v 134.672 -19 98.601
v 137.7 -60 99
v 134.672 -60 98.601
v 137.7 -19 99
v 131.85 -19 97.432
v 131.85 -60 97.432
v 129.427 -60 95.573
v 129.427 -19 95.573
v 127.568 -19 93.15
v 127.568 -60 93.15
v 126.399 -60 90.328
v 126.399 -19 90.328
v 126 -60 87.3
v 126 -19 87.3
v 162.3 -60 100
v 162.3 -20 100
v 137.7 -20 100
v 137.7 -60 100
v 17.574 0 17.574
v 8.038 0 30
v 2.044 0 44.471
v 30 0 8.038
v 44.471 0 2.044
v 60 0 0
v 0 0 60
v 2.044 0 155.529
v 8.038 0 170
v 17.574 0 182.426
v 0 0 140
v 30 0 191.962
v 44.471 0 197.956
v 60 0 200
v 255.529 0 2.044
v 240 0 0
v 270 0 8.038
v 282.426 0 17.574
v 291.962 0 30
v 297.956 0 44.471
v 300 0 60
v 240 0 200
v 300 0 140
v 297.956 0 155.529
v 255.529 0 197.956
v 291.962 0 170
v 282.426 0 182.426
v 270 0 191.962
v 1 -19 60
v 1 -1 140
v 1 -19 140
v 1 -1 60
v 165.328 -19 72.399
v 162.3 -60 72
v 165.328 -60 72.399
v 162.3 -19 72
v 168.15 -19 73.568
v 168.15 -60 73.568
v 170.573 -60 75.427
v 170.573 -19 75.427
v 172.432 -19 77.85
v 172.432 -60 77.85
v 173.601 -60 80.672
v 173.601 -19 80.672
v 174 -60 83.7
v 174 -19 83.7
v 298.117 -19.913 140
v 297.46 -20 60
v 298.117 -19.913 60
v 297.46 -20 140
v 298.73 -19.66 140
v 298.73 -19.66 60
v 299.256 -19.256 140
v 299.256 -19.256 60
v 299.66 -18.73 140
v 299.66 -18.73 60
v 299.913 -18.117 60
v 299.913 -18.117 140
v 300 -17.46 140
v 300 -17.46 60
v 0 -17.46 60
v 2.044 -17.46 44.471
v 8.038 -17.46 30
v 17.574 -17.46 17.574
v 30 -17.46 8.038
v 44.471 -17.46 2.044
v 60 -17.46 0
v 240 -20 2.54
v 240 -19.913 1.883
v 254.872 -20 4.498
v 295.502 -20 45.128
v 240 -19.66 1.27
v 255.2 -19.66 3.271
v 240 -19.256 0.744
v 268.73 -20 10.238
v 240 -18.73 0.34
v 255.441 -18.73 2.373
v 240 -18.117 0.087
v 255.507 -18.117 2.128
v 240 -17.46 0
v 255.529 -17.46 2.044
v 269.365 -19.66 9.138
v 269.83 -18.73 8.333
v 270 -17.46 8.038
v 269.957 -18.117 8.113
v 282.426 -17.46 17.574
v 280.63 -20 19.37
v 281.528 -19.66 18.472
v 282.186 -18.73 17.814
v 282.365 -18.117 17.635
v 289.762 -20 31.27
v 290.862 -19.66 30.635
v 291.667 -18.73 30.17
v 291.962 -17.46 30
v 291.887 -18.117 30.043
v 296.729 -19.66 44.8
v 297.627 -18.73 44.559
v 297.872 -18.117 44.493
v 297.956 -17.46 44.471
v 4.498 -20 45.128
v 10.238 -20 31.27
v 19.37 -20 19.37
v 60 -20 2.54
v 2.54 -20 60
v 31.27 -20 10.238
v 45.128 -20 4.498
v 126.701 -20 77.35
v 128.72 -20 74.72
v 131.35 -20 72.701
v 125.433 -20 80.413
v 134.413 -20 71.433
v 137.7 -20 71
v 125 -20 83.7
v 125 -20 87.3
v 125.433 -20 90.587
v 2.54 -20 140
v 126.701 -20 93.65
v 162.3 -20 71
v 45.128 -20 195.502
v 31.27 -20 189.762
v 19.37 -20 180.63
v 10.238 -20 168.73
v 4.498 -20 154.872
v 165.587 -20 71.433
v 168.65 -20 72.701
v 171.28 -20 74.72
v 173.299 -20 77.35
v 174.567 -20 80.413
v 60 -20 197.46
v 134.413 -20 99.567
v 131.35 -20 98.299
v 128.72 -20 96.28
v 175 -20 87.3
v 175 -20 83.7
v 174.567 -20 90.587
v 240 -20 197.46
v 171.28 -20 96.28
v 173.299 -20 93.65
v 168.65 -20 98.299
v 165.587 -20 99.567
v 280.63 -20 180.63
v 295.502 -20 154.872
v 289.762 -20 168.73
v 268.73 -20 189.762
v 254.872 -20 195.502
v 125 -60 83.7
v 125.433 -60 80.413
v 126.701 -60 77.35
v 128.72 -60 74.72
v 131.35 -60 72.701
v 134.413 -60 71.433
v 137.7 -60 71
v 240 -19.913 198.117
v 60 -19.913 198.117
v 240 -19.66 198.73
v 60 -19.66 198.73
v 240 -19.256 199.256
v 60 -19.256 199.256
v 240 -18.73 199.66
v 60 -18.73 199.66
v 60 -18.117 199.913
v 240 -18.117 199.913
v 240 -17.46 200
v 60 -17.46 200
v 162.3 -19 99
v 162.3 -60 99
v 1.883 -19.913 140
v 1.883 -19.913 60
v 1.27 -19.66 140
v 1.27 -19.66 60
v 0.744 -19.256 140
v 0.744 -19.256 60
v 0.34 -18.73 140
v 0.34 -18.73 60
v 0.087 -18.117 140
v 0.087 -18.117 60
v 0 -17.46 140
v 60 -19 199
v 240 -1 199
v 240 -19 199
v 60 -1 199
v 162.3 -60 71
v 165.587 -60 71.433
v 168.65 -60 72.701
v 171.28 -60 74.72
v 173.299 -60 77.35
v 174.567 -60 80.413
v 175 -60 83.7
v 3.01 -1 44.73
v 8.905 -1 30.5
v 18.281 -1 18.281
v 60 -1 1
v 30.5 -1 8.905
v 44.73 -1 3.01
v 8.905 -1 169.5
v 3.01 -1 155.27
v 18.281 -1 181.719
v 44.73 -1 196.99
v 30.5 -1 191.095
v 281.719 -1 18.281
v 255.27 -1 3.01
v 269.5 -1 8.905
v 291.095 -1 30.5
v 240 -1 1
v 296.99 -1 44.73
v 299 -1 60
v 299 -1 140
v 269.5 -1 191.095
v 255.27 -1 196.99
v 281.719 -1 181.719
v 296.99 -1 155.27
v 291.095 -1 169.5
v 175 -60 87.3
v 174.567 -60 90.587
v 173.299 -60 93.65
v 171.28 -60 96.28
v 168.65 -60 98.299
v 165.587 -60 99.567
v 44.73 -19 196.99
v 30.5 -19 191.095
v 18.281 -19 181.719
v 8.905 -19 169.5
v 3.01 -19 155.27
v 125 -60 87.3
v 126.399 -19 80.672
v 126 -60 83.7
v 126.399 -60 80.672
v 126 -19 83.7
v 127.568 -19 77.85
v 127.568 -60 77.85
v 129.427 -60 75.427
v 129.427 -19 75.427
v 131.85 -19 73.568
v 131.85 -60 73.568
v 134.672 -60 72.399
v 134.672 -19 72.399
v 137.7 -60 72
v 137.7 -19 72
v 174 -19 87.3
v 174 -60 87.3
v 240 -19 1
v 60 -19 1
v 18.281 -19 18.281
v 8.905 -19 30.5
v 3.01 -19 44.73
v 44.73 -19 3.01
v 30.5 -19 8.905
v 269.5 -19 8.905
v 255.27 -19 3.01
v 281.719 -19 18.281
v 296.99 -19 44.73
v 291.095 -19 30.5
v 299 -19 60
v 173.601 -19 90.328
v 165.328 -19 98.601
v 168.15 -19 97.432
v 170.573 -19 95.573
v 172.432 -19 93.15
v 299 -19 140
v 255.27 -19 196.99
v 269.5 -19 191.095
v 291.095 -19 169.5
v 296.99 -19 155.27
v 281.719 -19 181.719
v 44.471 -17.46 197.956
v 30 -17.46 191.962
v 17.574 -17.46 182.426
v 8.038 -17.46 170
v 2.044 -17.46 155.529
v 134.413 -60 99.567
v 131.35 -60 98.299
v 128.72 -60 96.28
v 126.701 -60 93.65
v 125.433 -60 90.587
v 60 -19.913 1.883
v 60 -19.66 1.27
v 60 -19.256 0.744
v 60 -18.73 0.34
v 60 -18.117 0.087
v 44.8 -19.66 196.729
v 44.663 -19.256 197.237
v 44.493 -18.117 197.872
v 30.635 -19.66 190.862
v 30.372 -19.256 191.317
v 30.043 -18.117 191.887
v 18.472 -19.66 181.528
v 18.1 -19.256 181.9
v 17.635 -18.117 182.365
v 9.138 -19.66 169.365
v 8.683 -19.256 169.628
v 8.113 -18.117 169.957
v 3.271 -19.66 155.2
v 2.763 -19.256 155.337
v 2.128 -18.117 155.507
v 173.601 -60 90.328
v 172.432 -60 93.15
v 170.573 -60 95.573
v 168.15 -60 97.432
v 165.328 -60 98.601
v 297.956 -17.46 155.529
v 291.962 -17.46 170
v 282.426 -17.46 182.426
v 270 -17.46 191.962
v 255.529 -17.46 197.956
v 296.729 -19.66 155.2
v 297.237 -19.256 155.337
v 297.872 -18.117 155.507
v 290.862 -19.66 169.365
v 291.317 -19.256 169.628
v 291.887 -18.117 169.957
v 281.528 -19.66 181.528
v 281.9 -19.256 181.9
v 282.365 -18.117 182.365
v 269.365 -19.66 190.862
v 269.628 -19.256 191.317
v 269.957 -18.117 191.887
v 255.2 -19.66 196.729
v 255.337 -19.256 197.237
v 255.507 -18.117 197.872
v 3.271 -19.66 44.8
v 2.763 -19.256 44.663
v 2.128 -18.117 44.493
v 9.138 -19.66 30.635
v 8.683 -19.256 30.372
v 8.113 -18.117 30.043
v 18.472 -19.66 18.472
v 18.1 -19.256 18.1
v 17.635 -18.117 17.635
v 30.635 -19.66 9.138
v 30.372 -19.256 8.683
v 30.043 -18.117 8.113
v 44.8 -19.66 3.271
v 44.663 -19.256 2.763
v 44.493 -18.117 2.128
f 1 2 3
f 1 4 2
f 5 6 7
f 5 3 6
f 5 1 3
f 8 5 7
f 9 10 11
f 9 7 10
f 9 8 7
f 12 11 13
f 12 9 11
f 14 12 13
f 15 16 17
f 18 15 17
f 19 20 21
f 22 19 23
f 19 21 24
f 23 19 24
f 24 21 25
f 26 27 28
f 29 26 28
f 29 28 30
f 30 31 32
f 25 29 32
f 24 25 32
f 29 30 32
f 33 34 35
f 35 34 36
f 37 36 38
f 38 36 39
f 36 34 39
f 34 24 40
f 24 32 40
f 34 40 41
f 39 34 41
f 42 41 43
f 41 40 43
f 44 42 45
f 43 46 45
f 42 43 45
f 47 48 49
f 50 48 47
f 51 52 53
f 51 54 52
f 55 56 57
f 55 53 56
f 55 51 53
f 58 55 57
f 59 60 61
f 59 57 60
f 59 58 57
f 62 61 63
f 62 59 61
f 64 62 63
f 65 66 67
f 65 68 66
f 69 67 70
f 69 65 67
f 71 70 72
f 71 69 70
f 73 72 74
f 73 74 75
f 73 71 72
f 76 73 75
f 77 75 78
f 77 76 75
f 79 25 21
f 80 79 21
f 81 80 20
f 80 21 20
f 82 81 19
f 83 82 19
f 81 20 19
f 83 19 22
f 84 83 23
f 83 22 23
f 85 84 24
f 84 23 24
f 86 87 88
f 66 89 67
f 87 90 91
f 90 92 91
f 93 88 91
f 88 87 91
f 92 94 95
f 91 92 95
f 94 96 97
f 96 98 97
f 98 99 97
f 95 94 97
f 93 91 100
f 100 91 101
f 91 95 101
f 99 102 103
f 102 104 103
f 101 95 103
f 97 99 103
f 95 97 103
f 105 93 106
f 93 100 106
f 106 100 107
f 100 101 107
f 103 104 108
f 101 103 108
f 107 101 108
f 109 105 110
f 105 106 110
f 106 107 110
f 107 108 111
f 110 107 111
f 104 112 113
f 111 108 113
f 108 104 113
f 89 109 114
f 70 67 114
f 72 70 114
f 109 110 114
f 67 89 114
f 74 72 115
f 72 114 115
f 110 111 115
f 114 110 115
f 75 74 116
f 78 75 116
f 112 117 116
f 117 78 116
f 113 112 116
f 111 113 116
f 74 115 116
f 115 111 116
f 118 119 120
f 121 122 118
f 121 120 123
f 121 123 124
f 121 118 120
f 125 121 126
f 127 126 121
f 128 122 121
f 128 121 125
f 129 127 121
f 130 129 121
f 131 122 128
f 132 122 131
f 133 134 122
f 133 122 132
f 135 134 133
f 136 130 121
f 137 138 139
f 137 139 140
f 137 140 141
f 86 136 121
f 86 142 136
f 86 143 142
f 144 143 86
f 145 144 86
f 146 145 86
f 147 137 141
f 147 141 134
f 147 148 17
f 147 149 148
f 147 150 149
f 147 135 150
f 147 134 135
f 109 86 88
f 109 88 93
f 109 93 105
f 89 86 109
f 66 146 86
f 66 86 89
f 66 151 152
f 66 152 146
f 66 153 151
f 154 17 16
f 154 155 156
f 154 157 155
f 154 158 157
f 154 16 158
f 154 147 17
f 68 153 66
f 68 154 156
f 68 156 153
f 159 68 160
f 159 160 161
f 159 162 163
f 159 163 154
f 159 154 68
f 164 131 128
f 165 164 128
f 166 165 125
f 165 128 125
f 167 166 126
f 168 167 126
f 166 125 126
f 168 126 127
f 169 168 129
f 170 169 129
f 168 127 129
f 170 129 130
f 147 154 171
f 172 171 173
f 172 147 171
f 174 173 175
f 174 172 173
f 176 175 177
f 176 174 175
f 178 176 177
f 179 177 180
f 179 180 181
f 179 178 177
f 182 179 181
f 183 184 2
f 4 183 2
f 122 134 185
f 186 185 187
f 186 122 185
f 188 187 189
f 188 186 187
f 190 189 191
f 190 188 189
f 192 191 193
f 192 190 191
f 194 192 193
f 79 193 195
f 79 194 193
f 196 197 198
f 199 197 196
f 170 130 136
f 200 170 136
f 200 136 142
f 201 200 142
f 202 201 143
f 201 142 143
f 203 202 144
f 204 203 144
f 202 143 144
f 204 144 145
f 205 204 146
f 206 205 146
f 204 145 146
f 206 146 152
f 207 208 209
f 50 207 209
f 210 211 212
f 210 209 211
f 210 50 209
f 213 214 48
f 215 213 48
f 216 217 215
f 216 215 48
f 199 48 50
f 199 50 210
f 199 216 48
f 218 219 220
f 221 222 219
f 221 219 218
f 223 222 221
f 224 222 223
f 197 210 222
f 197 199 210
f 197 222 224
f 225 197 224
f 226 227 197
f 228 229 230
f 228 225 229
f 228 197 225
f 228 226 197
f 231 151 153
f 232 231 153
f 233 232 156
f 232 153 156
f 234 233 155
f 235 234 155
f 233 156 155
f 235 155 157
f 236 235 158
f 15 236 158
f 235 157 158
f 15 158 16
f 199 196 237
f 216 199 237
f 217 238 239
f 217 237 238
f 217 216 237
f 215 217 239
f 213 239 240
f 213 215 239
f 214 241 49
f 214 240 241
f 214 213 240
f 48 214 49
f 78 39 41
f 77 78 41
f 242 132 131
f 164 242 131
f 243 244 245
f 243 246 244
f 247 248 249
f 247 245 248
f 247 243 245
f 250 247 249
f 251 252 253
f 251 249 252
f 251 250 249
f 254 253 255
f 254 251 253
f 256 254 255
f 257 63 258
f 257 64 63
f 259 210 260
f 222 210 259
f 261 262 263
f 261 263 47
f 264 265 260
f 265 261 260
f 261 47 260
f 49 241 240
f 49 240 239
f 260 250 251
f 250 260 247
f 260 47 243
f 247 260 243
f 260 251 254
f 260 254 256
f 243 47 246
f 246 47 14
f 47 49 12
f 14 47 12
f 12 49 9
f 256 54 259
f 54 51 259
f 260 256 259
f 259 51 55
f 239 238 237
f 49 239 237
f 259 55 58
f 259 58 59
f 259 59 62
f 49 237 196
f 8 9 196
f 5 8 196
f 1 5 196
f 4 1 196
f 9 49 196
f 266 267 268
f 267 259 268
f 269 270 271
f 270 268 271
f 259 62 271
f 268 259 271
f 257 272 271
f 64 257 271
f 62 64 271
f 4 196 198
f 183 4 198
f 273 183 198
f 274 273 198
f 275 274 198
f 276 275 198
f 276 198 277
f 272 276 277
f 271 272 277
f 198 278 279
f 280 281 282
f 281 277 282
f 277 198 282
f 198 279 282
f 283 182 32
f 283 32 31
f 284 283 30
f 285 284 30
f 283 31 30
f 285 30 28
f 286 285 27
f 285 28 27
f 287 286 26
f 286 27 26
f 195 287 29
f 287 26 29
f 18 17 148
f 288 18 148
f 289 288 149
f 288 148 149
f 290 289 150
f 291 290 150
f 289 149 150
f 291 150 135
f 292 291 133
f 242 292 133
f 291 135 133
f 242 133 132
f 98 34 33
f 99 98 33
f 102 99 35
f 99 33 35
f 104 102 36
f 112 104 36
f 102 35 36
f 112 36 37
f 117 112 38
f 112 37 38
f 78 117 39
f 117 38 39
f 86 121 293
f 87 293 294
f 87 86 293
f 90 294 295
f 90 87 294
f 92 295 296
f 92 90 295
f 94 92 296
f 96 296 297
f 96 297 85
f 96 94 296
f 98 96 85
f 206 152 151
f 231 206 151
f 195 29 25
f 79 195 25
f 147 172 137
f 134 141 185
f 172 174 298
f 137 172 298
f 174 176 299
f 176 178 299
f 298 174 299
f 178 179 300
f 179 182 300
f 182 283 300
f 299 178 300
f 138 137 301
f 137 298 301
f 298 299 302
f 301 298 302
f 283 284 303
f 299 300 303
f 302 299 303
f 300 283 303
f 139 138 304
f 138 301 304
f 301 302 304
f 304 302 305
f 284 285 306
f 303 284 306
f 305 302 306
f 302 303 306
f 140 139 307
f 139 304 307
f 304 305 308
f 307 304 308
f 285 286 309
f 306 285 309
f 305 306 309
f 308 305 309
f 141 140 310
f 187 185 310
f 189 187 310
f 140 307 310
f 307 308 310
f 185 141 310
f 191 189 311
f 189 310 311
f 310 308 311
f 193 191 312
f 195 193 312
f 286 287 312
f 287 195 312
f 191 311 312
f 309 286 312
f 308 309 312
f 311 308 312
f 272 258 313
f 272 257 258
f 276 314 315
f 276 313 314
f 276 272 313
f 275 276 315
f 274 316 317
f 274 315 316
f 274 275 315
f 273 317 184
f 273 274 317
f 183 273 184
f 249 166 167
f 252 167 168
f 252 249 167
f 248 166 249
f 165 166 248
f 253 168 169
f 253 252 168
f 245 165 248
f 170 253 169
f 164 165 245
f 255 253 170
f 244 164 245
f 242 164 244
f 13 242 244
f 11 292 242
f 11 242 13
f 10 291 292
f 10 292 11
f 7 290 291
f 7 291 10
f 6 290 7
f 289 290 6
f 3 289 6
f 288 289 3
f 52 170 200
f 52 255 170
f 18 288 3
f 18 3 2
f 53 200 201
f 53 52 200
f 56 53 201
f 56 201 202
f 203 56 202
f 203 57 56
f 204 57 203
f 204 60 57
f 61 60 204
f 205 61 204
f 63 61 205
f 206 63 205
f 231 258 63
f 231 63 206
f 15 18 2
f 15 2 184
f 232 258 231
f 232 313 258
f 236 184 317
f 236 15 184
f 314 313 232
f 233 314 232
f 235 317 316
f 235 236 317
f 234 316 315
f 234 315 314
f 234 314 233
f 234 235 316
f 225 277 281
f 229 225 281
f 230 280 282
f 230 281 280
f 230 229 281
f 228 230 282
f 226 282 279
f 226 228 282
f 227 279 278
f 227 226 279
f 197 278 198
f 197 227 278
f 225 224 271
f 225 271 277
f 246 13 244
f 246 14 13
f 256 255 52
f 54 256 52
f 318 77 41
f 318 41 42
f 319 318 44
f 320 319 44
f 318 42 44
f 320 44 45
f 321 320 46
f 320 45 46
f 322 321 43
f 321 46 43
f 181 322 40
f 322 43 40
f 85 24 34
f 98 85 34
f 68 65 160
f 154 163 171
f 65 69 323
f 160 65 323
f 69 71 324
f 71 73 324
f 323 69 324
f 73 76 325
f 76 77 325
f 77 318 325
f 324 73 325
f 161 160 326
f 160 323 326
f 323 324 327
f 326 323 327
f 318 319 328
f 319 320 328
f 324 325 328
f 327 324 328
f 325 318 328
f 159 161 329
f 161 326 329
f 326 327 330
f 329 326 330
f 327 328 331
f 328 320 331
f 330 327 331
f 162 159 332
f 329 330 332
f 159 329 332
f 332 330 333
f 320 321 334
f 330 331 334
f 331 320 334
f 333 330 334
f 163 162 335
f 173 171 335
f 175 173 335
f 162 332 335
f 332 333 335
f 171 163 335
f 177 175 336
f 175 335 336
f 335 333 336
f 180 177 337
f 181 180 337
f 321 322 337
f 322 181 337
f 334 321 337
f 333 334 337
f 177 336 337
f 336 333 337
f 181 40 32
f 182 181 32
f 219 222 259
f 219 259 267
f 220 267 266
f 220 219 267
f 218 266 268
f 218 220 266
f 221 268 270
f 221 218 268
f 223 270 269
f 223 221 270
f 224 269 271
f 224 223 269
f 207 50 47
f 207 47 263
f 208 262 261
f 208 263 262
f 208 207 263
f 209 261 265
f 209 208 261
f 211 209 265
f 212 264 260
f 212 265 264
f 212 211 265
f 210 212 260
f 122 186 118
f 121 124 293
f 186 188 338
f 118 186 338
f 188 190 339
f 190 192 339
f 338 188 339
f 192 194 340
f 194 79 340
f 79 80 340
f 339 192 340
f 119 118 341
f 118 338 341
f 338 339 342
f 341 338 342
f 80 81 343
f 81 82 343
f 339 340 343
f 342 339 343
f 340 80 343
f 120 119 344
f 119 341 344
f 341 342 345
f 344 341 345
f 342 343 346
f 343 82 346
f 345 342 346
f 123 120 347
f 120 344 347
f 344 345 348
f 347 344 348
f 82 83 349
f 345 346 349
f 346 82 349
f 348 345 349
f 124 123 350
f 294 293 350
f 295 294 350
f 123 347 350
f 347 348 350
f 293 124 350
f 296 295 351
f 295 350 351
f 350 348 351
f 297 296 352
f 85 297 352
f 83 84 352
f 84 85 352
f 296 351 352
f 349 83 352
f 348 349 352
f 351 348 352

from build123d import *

# Parameters (mm, degrees)
F1_DEPTH = 20
F3_DEPTH = 40
F4_T     = -1
F5_R     = 2.54


with BuildPart() as f1:
    # F0 (on Front) → F1 (new body)
    with BuildSketch(Plane.XZ):
        with BuildLine():
            ThreePointArc((0, 60), (17.5735931288, 17.5735931288), (60, 0))
            Line((60, 0), (240, 0))
            ThreePointArc((240, 0), (282.4264068712, 17.5735931288), (300, 60))
            Line((300, 60), (300, 140))
            ThreePointArc((300, 140), (282.4264068712, 182.4264068712), (240, 200))
            Line((240, 200), (60, 200))
            ThreePointArc((60, 200), (17.5735931288, 182.4264068712), (0, 140))
            Line((0, 140), (0, 60))
        make_face()
    extrude(amount=F1_DEPTH)

    # F2 (on face) → F3 (join)
    with BuildSketch(Plane.XZ.offset(20)):
        with BuildLine():
            Line((175, 83.7), (175, 85.5))
            Line((175, 85.5), (175, 87.3))
            ThreePointArc((175, 87.3), (171.2802561211, 96.2802561211), (162.3, 100))
            Line((162.3, 100), (150, 100))
            Line((150, 100), (137.7, 100))
            ThreePointArc((137.7, 100), (128.7197438789, 96.2802561211), (125, 87.3))
            Line((125, 87.3), (125, 85.5))
            Line((125, 85.5), (125, 83.7))
            ThreePointArc((125, 83.7), (128.7197438789, 74.7197438789), (137.7, 71))
            Line((137.7, 71), (162.3, 71))
            ThreePointArc((162.3, 71), (171.2802561211, 74.7197438789), (175, 83.7))
        make_face()
    extrude(amount=F3_DEPTH)

    # F4
    f4_openings = [f1.faces().sort_by_distance(p)[0] for p in [
        (150, -60, 85.5),
    ]]
    offset(amount=F4_T, openings=f4_openings, kind=Kind.INTERSECTION)

    # F5
    f5_edges = [f1.edges().sort_by_distance(p)[0] for p in [
        (300, -20, 100),
        (150, -20, 200),
        (0, -20, 100),
        (150, -20, 0),
    ]]
    fillet(f5_edges, radius=F5_R)


solid = f1.part
